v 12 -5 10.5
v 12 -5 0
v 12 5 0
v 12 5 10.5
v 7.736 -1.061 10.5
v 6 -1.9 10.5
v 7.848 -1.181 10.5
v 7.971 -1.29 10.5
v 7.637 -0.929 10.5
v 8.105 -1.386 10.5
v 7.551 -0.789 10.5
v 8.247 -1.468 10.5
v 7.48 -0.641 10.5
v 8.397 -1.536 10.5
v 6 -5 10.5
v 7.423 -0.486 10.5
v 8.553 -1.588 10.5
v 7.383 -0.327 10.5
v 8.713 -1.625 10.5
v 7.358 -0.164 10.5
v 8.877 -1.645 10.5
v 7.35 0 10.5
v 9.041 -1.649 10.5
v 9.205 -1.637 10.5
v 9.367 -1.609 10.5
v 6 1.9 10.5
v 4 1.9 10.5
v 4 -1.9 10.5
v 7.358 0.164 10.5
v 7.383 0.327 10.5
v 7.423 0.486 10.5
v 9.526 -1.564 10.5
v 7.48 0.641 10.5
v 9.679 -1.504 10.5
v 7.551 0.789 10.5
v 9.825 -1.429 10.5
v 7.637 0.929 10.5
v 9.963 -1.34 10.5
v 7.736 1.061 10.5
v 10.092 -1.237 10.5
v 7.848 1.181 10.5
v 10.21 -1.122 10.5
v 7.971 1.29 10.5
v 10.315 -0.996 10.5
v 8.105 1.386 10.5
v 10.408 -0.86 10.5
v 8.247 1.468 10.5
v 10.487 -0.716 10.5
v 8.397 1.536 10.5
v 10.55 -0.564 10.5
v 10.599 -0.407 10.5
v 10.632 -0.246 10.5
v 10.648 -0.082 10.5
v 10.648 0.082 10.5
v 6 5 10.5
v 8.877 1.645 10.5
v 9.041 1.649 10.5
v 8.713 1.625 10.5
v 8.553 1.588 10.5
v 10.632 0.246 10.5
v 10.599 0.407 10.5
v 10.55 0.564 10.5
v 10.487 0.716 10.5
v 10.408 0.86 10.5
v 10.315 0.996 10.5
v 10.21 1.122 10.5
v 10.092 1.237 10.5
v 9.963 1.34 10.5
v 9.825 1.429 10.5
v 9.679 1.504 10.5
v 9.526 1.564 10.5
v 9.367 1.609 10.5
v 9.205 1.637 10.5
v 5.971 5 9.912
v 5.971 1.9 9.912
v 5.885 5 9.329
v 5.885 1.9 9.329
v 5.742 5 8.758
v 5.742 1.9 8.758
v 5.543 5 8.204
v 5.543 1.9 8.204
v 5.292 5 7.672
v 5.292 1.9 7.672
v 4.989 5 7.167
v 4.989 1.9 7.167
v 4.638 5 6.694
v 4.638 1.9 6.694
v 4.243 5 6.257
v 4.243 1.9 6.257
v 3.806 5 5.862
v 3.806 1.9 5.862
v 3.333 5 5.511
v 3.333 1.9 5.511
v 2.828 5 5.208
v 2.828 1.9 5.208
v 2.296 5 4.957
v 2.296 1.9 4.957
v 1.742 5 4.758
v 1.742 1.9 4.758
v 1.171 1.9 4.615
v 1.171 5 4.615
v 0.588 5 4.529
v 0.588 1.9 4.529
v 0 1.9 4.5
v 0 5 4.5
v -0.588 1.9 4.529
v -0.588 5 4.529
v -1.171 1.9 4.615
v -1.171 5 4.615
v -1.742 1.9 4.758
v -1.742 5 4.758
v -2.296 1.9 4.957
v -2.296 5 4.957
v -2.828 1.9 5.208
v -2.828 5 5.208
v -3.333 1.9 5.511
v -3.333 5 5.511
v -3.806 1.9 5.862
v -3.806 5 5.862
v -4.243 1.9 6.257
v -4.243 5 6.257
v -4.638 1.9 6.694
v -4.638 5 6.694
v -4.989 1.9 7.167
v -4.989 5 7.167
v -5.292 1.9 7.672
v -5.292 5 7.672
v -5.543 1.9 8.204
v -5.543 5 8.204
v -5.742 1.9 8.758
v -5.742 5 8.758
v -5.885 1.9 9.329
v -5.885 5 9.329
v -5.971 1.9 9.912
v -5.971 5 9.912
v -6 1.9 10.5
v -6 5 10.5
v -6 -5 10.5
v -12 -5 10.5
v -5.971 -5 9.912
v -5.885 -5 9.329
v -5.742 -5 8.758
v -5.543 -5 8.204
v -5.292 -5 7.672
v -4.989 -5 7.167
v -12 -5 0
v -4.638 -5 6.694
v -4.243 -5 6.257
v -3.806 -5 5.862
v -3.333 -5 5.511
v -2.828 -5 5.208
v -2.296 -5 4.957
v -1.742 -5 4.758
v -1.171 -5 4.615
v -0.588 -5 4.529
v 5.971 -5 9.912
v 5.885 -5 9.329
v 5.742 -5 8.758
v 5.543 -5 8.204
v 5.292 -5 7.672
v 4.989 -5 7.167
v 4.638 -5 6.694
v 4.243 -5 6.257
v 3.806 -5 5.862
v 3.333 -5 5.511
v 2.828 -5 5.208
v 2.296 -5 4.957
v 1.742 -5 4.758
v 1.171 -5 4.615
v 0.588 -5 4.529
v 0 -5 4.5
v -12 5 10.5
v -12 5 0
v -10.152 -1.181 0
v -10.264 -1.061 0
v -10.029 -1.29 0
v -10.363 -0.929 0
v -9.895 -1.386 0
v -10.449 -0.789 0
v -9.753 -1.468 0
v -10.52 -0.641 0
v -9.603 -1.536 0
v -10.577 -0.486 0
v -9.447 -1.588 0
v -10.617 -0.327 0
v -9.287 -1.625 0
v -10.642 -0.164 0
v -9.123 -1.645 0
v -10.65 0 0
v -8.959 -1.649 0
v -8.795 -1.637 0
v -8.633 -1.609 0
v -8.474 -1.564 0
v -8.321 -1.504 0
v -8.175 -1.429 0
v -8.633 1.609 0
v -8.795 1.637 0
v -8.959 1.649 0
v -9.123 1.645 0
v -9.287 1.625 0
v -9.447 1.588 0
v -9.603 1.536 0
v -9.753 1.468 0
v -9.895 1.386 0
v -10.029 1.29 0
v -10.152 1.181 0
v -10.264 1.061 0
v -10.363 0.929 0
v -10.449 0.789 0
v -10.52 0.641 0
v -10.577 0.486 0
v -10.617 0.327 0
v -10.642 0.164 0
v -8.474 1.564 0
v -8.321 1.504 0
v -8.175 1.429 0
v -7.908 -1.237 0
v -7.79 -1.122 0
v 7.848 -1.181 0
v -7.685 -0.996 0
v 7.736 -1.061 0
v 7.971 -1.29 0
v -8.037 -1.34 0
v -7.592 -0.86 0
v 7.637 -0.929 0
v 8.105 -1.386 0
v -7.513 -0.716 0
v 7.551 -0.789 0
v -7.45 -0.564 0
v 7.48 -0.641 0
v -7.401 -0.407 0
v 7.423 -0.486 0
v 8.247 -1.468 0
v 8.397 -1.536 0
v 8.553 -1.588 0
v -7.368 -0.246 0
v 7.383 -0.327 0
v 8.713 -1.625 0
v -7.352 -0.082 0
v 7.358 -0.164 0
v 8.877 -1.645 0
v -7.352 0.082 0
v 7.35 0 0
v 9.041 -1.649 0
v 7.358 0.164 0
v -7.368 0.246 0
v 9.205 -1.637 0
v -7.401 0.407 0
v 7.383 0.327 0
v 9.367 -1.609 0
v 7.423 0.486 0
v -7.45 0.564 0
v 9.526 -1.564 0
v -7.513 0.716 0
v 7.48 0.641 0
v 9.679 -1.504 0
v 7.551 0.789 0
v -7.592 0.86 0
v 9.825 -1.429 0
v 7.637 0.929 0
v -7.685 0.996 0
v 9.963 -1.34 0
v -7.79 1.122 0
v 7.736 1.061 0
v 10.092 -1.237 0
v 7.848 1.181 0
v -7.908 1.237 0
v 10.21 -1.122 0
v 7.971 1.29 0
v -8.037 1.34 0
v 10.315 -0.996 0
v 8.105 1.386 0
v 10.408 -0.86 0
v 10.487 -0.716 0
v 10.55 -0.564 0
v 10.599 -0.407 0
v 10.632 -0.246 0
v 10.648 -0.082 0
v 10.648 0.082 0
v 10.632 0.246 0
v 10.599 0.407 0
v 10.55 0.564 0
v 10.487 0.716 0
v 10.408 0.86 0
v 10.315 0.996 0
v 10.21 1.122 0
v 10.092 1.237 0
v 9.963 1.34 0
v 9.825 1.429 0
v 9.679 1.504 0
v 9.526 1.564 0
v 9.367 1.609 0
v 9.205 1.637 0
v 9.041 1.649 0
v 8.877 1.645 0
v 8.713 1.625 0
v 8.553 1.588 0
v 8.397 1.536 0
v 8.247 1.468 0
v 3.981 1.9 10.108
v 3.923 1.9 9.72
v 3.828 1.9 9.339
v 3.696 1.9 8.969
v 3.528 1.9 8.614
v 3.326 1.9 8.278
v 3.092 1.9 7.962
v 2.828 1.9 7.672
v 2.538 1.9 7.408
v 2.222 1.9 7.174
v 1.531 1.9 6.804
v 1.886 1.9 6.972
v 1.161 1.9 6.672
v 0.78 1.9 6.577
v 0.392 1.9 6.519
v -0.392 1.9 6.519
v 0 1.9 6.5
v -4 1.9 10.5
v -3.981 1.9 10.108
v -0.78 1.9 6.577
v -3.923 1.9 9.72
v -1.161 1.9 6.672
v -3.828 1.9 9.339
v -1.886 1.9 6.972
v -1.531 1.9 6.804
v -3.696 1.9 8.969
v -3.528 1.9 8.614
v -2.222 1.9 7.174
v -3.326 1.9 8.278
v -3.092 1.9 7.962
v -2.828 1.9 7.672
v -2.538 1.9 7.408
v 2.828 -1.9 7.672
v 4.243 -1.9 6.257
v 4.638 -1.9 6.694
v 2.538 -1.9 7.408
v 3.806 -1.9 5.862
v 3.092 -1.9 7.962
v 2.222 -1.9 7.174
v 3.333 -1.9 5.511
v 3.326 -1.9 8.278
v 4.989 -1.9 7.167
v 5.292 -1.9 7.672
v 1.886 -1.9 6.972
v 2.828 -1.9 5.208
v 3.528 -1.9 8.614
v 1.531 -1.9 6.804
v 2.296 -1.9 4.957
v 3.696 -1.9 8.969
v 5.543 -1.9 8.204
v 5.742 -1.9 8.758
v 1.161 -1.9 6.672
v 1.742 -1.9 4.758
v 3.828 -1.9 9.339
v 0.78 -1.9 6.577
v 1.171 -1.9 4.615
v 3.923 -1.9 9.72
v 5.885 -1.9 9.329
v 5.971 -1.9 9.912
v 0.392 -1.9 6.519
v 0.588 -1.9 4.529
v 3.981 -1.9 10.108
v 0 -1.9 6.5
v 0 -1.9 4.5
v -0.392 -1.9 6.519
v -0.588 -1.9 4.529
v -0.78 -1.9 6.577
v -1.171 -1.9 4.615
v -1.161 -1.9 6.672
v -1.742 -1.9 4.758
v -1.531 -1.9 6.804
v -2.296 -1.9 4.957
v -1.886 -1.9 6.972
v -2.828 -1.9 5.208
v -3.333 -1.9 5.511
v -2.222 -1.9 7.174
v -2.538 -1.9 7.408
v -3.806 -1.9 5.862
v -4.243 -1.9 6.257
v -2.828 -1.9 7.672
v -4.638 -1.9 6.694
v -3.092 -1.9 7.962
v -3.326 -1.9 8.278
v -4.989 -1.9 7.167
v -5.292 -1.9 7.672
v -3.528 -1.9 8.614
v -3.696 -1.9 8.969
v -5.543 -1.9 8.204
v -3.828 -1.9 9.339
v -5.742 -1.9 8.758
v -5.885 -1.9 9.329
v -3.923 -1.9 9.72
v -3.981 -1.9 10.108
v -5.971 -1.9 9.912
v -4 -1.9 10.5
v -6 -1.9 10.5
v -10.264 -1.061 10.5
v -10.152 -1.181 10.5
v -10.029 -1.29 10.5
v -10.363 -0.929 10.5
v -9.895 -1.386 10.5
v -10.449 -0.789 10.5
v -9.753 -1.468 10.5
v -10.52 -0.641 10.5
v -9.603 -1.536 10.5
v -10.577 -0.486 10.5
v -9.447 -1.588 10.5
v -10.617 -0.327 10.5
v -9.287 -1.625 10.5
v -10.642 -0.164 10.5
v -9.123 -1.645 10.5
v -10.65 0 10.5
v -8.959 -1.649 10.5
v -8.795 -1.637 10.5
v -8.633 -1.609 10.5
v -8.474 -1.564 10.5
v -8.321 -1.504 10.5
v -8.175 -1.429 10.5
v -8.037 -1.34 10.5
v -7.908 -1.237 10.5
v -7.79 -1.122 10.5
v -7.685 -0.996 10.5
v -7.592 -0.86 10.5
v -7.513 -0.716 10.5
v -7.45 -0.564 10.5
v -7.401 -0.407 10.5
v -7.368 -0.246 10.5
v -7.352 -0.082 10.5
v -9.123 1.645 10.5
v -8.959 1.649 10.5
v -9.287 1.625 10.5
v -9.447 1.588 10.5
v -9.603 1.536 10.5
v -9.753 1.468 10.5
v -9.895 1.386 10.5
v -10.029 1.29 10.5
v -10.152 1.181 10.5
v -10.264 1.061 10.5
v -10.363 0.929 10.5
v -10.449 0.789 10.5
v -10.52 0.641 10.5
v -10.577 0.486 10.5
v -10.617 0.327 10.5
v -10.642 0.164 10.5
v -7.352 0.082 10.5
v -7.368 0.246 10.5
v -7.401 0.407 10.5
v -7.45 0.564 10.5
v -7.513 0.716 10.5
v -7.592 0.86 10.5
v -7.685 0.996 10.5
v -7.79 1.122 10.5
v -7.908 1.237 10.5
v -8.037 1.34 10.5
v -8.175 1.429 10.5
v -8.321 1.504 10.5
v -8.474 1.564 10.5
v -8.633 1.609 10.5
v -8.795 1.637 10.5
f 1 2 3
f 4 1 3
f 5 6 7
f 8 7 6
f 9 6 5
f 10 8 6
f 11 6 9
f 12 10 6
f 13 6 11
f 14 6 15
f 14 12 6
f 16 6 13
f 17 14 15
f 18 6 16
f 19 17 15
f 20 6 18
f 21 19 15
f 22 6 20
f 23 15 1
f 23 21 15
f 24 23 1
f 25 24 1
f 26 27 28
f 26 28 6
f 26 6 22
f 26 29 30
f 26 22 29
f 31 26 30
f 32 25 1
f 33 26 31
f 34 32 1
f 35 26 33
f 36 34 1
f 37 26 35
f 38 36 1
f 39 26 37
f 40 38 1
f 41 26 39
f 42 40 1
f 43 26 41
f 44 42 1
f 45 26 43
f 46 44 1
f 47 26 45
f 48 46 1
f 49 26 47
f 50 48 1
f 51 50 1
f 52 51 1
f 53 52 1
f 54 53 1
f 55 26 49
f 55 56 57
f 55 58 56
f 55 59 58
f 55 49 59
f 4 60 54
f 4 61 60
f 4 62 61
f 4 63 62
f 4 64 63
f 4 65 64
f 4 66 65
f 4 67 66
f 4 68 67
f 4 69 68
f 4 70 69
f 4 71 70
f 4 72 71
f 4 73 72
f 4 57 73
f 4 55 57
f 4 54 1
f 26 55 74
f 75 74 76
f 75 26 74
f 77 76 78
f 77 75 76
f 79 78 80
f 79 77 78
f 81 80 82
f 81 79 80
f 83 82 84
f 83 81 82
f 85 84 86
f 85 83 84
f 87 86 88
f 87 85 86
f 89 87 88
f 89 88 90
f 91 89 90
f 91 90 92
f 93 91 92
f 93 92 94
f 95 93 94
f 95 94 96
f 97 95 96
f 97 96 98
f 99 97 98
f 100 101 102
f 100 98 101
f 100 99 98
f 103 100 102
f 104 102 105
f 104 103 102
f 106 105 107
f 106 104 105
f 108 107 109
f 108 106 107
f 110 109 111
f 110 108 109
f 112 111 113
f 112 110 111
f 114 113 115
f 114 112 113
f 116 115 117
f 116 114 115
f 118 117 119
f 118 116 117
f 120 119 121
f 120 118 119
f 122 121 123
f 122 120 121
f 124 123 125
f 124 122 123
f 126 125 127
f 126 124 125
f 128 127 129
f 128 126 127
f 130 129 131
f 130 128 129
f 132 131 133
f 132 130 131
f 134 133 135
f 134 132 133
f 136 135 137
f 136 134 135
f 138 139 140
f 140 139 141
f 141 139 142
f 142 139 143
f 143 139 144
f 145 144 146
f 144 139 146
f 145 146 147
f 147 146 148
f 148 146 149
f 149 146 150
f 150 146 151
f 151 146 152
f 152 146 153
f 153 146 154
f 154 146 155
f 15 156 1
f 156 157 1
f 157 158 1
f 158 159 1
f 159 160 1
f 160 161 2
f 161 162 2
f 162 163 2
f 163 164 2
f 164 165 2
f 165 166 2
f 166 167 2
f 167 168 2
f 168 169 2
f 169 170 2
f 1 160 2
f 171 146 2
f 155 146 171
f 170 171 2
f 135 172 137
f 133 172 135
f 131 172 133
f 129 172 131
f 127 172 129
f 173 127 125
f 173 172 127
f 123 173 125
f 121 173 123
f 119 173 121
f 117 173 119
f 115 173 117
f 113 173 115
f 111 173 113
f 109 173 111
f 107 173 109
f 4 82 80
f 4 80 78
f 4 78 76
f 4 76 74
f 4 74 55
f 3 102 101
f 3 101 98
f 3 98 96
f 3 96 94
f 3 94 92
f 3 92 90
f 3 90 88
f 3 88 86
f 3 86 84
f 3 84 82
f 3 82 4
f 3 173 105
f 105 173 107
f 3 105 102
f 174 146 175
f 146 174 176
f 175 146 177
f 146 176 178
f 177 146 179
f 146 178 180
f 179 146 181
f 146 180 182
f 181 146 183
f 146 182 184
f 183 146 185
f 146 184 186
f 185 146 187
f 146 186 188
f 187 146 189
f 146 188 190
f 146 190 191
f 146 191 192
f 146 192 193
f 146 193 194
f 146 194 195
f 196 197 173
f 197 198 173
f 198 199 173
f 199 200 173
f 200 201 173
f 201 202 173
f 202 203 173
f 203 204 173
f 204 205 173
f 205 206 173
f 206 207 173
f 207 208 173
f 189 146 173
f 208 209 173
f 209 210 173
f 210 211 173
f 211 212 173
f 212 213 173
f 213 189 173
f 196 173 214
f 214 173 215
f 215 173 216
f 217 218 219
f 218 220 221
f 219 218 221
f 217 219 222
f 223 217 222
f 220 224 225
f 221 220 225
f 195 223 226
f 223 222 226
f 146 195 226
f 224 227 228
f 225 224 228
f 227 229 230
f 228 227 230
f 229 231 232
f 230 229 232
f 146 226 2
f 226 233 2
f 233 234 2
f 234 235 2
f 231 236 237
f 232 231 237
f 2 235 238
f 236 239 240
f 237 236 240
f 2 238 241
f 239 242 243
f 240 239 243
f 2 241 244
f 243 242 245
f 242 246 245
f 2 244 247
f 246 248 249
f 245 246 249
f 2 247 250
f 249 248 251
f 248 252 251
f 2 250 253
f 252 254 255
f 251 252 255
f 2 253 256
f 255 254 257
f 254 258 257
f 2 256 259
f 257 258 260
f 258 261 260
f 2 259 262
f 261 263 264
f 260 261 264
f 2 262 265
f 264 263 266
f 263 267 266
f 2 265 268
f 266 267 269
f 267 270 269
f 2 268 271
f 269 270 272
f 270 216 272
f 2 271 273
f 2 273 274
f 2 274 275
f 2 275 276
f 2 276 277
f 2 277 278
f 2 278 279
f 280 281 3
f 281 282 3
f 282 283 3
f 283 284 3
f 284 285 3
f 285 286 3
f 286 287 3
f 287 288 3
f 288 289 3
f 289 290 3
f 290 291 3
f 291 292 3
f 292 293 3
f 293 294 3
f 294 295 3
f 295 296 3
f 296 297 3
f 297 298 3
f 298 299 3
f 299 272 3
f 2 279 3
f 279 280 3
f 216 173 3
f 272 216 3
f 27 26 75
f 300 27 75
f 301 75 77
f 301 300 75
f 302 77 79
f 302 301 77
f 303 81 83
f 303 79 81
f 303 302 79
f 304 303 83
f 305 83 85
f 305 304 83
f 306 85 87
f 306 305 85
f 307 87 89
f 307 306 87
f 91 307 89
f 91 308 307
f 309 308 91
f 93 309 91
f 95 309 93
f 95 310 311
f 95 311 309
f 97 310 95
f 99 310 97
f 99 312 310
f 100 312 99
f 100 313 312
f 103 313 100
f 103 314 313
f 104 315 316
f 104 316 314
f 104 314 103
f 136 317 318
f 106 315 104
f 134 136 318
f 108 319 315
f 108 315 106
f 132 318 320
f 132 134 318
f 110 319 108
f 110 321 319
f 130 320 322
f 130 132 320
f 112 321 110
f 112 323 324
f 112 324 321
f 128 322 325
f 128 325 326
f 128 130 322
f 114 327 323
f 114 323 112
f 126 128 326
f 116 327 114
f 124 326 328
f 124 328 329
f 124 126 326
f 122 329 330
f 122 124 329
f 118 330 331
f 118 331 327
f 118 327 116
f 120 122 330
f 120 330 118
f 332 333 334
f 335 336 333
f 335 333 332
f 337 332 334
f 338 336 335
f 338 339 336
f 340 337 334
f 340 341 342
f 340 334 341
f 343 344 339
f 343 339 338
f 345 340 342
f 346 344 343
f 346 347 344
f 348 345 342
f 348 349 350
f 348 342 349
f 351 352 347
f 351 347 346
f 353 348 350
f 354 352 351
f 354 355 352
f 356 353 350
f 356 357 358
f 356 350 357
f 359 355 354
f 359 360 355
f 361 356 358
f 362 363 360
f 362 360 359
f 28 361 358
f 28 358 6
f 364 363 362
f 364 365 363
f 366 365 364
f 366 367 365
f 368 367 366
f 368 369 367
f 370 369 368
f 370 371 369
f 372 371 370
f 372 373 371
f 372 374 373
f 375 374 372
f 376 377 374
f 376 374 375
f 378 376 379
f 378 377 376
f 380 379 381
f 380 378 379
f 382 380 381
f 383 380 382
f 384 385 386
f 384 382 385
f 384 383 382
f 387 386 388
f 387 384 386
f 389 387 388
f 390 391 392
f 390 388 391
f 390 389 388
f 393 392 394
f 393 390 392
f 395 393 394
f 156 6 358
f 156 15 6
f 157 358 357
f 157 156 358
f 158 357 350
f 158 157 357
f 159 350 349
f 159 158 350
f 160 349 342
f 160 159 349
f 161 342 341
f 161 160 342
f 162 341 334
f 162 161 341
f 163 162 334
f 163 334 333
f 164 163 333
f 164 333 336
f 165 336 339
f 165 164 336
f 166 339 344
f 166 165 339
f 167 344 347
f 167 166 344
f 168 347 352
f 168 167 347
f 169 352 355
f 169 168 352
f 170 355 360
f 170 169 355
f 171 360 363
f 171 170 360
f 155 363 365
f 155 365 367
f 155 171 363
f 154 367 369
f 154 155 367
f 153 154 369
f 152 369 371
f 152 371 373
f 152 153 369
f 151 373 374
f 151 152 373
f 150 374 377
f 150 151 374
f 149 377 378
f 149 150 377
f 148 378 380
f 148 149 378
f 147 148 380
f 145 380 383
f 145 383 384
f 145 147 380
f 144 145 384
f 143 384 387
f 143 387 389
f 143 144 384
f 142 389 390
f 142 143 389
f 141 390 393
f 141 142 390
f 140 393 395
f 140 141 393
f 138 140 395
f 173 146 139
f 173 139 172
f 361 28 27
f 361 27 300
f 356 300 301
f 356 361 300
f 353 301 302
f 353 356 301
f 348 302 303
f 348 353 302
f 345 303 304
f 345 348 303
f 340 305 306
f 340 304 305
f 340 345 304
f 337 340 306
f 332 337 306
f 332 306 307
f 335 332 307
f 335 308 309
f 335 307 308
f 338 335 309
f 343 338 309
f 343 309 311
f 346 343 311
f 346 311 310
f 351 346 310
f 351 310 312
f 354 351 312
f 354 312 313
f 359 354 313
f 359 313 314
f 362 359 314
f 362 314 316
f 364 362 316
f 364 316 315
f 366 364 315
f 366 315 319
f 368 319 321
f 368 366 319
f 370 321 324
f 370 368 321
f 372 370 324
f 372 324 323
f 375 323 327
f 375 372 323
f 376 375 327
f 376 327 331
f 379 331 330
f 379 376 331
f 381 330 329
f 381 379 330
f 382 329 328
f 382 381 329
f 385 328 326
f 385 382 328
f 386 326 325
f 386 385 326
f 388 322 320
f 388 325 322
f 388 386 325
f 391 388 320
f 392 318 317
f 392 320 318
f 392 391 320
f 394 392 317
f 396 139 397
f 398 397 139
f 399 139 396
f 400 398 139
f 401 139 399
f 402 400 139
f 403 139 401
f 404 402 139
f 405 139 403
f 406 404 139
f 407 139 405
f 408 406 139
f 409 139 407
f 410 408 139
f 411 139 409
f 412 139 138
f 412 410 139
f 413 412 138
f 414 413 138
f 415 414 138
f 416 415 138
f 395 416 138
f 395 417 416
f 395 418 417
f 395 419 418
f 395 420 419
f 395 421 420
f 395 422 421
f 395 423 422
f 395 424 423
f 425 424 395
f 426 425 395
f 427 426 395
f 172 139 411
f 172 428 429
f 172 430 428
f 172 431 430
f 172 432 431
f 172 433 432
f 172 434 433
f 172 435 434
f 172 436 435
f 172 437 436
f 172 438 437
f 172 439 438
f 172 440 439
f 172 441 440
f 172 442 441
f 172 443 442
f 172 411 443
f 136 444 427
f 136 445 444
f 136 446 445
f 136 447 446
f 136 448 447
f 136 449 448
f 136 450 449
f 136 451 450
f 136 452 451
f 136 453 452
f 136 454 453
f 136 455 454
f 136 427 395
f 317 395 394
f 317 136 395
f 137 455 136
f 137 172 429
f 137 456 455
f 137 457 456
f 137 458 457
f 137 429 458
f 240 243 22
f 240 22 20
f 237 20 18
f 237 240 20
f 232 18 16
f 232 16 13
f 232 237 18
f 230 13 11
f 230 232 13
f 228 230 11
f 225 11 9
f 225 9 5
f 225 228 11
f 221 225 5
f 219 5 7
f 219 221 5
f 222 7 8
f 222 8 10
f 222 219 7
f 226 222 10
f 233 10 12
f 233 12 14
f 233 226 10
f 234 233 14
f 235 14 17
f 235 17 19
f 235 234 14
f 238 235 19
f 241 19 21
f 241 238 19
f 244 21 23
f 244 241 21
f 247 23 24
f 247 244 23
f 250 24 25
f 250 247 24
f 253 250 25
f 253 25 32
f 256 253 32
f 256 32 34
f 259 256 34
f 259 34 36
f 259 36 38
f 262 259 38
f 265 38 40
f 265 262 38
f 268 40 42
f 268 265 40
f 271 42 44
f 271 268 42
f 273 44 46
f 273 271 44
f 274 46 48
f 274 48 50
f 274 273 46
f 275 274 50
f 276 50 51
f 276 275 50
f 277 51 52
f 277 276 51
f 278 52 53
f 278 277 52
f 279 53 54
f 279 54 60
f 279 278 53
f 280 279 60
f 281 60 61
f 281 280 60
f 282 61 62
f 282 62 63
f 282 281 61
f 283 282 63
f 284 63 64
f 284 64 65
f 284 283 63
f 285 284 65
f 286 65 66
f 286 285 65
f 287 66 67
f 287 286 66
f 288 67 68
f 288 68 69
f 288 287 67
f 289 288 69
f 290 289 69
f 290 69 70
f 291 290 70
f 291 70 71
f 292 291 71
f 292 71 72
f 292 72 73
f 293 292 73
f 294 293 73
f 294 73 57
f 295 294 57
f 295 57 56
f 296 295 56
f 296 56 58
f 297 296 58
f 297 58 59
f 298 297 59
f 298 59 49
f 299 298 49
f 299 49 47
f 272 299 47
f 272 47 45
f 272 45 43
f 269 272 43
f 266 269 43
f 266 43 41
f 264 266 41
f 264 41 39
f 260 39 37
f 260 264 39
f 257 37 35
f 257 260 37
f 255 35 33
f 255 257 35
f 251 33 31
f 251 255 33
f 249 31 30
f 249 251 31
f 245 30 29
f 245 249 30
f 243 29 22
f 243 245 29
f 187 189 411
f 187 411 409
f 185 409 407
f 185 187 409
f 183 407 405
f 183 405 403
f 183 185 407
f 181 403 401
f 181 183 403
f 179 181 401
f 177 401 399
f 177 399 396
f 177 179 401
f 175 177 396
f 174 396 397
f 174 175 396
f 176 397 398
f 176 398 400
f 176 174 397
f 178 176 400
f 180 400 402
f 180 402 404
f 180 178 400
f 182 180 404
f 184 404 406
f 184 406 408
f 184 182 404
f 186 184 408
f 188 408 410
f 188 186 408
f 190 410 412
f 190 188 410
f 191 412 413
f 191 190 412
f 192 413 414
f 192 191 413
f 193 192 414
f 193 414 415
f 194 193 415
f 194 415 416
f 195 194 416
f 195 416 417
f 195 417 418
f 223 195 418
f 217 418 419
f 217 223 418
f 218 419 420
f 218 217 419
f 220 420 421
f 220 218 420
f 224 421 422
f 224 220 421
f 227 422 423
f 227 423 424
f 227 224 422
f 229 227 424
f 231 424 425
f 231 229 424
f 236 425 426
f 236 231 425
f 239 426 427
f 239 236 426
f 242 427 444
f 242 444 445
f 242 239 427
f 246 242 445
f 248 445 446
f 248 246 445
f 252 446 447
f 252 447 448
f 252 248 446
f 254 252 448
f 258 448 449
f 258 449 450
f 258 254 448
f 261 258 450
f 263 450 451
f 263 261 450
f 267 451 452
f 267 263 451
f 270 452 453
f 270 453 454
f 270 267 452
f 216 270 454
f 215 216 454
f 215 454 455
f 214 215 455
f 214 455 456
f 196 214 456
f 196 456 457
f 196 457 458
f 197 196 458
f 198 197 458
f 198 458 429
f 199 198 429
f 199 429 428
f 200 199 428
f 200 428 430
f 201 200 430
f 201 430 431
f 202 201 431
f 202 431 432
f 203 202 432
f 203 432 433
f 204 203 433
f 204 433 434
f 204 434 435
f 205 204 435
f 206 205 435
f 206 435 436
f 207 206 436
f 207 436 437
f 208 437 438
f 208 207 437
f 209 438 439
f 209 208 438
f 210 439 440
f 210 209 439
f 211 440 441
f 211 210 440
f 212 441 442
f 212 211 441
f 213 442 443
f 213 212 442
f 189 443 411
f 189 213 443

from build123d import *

# Parameters (mm, degrees)
CROQUIS1_W              = 24
CROQUIS1_H              = 10
CROQUIS1_R              = 1.65
SALIENTE_EXTRUIR1_DEPTH = 10.5


with BuildPart() as part:
    # Croquis1 → Saliente-Extruir1 (new body)
    with BuildSketch(Plane.XY):
        Rectangle(CROQUIS1_W, CROQUIS1_H)
        with Locations(Location((-9, 0, 0), (0, 0, 180))):
            Circle(CROQUIS1_R, mode=Mode.SUBTRACT)
        with Locations(Location((9, 0, 0), (0, 0, 180))):
            Circle(CROQUIS1_R, mode=Mode.SUBTRACT)
    extrude(amount=SALIENTE_EXTRUIR1_DEPTH)

    # Croquis2 → Cortar-Revolución1 (revolve, cut)
    with BuildSketch(Plane(origin=(0, 0, 0), x_dir=(0, 0, -1), z_dir=(1, 0, 0))):
        Polygon((-6.5, 1.9), (-6.5, -1.9), (-4.5, -1.9), (-4.5, -5), (-10.5, -5), (-10.5, 5), (-4.5, 5), (-4.5, 1.9), align=None)
    revolve(axis=Axis((0, 5.062819344, 10.5), (0, 1, 0)), mode=Mode.SUBTRACT)


solid = part.part
